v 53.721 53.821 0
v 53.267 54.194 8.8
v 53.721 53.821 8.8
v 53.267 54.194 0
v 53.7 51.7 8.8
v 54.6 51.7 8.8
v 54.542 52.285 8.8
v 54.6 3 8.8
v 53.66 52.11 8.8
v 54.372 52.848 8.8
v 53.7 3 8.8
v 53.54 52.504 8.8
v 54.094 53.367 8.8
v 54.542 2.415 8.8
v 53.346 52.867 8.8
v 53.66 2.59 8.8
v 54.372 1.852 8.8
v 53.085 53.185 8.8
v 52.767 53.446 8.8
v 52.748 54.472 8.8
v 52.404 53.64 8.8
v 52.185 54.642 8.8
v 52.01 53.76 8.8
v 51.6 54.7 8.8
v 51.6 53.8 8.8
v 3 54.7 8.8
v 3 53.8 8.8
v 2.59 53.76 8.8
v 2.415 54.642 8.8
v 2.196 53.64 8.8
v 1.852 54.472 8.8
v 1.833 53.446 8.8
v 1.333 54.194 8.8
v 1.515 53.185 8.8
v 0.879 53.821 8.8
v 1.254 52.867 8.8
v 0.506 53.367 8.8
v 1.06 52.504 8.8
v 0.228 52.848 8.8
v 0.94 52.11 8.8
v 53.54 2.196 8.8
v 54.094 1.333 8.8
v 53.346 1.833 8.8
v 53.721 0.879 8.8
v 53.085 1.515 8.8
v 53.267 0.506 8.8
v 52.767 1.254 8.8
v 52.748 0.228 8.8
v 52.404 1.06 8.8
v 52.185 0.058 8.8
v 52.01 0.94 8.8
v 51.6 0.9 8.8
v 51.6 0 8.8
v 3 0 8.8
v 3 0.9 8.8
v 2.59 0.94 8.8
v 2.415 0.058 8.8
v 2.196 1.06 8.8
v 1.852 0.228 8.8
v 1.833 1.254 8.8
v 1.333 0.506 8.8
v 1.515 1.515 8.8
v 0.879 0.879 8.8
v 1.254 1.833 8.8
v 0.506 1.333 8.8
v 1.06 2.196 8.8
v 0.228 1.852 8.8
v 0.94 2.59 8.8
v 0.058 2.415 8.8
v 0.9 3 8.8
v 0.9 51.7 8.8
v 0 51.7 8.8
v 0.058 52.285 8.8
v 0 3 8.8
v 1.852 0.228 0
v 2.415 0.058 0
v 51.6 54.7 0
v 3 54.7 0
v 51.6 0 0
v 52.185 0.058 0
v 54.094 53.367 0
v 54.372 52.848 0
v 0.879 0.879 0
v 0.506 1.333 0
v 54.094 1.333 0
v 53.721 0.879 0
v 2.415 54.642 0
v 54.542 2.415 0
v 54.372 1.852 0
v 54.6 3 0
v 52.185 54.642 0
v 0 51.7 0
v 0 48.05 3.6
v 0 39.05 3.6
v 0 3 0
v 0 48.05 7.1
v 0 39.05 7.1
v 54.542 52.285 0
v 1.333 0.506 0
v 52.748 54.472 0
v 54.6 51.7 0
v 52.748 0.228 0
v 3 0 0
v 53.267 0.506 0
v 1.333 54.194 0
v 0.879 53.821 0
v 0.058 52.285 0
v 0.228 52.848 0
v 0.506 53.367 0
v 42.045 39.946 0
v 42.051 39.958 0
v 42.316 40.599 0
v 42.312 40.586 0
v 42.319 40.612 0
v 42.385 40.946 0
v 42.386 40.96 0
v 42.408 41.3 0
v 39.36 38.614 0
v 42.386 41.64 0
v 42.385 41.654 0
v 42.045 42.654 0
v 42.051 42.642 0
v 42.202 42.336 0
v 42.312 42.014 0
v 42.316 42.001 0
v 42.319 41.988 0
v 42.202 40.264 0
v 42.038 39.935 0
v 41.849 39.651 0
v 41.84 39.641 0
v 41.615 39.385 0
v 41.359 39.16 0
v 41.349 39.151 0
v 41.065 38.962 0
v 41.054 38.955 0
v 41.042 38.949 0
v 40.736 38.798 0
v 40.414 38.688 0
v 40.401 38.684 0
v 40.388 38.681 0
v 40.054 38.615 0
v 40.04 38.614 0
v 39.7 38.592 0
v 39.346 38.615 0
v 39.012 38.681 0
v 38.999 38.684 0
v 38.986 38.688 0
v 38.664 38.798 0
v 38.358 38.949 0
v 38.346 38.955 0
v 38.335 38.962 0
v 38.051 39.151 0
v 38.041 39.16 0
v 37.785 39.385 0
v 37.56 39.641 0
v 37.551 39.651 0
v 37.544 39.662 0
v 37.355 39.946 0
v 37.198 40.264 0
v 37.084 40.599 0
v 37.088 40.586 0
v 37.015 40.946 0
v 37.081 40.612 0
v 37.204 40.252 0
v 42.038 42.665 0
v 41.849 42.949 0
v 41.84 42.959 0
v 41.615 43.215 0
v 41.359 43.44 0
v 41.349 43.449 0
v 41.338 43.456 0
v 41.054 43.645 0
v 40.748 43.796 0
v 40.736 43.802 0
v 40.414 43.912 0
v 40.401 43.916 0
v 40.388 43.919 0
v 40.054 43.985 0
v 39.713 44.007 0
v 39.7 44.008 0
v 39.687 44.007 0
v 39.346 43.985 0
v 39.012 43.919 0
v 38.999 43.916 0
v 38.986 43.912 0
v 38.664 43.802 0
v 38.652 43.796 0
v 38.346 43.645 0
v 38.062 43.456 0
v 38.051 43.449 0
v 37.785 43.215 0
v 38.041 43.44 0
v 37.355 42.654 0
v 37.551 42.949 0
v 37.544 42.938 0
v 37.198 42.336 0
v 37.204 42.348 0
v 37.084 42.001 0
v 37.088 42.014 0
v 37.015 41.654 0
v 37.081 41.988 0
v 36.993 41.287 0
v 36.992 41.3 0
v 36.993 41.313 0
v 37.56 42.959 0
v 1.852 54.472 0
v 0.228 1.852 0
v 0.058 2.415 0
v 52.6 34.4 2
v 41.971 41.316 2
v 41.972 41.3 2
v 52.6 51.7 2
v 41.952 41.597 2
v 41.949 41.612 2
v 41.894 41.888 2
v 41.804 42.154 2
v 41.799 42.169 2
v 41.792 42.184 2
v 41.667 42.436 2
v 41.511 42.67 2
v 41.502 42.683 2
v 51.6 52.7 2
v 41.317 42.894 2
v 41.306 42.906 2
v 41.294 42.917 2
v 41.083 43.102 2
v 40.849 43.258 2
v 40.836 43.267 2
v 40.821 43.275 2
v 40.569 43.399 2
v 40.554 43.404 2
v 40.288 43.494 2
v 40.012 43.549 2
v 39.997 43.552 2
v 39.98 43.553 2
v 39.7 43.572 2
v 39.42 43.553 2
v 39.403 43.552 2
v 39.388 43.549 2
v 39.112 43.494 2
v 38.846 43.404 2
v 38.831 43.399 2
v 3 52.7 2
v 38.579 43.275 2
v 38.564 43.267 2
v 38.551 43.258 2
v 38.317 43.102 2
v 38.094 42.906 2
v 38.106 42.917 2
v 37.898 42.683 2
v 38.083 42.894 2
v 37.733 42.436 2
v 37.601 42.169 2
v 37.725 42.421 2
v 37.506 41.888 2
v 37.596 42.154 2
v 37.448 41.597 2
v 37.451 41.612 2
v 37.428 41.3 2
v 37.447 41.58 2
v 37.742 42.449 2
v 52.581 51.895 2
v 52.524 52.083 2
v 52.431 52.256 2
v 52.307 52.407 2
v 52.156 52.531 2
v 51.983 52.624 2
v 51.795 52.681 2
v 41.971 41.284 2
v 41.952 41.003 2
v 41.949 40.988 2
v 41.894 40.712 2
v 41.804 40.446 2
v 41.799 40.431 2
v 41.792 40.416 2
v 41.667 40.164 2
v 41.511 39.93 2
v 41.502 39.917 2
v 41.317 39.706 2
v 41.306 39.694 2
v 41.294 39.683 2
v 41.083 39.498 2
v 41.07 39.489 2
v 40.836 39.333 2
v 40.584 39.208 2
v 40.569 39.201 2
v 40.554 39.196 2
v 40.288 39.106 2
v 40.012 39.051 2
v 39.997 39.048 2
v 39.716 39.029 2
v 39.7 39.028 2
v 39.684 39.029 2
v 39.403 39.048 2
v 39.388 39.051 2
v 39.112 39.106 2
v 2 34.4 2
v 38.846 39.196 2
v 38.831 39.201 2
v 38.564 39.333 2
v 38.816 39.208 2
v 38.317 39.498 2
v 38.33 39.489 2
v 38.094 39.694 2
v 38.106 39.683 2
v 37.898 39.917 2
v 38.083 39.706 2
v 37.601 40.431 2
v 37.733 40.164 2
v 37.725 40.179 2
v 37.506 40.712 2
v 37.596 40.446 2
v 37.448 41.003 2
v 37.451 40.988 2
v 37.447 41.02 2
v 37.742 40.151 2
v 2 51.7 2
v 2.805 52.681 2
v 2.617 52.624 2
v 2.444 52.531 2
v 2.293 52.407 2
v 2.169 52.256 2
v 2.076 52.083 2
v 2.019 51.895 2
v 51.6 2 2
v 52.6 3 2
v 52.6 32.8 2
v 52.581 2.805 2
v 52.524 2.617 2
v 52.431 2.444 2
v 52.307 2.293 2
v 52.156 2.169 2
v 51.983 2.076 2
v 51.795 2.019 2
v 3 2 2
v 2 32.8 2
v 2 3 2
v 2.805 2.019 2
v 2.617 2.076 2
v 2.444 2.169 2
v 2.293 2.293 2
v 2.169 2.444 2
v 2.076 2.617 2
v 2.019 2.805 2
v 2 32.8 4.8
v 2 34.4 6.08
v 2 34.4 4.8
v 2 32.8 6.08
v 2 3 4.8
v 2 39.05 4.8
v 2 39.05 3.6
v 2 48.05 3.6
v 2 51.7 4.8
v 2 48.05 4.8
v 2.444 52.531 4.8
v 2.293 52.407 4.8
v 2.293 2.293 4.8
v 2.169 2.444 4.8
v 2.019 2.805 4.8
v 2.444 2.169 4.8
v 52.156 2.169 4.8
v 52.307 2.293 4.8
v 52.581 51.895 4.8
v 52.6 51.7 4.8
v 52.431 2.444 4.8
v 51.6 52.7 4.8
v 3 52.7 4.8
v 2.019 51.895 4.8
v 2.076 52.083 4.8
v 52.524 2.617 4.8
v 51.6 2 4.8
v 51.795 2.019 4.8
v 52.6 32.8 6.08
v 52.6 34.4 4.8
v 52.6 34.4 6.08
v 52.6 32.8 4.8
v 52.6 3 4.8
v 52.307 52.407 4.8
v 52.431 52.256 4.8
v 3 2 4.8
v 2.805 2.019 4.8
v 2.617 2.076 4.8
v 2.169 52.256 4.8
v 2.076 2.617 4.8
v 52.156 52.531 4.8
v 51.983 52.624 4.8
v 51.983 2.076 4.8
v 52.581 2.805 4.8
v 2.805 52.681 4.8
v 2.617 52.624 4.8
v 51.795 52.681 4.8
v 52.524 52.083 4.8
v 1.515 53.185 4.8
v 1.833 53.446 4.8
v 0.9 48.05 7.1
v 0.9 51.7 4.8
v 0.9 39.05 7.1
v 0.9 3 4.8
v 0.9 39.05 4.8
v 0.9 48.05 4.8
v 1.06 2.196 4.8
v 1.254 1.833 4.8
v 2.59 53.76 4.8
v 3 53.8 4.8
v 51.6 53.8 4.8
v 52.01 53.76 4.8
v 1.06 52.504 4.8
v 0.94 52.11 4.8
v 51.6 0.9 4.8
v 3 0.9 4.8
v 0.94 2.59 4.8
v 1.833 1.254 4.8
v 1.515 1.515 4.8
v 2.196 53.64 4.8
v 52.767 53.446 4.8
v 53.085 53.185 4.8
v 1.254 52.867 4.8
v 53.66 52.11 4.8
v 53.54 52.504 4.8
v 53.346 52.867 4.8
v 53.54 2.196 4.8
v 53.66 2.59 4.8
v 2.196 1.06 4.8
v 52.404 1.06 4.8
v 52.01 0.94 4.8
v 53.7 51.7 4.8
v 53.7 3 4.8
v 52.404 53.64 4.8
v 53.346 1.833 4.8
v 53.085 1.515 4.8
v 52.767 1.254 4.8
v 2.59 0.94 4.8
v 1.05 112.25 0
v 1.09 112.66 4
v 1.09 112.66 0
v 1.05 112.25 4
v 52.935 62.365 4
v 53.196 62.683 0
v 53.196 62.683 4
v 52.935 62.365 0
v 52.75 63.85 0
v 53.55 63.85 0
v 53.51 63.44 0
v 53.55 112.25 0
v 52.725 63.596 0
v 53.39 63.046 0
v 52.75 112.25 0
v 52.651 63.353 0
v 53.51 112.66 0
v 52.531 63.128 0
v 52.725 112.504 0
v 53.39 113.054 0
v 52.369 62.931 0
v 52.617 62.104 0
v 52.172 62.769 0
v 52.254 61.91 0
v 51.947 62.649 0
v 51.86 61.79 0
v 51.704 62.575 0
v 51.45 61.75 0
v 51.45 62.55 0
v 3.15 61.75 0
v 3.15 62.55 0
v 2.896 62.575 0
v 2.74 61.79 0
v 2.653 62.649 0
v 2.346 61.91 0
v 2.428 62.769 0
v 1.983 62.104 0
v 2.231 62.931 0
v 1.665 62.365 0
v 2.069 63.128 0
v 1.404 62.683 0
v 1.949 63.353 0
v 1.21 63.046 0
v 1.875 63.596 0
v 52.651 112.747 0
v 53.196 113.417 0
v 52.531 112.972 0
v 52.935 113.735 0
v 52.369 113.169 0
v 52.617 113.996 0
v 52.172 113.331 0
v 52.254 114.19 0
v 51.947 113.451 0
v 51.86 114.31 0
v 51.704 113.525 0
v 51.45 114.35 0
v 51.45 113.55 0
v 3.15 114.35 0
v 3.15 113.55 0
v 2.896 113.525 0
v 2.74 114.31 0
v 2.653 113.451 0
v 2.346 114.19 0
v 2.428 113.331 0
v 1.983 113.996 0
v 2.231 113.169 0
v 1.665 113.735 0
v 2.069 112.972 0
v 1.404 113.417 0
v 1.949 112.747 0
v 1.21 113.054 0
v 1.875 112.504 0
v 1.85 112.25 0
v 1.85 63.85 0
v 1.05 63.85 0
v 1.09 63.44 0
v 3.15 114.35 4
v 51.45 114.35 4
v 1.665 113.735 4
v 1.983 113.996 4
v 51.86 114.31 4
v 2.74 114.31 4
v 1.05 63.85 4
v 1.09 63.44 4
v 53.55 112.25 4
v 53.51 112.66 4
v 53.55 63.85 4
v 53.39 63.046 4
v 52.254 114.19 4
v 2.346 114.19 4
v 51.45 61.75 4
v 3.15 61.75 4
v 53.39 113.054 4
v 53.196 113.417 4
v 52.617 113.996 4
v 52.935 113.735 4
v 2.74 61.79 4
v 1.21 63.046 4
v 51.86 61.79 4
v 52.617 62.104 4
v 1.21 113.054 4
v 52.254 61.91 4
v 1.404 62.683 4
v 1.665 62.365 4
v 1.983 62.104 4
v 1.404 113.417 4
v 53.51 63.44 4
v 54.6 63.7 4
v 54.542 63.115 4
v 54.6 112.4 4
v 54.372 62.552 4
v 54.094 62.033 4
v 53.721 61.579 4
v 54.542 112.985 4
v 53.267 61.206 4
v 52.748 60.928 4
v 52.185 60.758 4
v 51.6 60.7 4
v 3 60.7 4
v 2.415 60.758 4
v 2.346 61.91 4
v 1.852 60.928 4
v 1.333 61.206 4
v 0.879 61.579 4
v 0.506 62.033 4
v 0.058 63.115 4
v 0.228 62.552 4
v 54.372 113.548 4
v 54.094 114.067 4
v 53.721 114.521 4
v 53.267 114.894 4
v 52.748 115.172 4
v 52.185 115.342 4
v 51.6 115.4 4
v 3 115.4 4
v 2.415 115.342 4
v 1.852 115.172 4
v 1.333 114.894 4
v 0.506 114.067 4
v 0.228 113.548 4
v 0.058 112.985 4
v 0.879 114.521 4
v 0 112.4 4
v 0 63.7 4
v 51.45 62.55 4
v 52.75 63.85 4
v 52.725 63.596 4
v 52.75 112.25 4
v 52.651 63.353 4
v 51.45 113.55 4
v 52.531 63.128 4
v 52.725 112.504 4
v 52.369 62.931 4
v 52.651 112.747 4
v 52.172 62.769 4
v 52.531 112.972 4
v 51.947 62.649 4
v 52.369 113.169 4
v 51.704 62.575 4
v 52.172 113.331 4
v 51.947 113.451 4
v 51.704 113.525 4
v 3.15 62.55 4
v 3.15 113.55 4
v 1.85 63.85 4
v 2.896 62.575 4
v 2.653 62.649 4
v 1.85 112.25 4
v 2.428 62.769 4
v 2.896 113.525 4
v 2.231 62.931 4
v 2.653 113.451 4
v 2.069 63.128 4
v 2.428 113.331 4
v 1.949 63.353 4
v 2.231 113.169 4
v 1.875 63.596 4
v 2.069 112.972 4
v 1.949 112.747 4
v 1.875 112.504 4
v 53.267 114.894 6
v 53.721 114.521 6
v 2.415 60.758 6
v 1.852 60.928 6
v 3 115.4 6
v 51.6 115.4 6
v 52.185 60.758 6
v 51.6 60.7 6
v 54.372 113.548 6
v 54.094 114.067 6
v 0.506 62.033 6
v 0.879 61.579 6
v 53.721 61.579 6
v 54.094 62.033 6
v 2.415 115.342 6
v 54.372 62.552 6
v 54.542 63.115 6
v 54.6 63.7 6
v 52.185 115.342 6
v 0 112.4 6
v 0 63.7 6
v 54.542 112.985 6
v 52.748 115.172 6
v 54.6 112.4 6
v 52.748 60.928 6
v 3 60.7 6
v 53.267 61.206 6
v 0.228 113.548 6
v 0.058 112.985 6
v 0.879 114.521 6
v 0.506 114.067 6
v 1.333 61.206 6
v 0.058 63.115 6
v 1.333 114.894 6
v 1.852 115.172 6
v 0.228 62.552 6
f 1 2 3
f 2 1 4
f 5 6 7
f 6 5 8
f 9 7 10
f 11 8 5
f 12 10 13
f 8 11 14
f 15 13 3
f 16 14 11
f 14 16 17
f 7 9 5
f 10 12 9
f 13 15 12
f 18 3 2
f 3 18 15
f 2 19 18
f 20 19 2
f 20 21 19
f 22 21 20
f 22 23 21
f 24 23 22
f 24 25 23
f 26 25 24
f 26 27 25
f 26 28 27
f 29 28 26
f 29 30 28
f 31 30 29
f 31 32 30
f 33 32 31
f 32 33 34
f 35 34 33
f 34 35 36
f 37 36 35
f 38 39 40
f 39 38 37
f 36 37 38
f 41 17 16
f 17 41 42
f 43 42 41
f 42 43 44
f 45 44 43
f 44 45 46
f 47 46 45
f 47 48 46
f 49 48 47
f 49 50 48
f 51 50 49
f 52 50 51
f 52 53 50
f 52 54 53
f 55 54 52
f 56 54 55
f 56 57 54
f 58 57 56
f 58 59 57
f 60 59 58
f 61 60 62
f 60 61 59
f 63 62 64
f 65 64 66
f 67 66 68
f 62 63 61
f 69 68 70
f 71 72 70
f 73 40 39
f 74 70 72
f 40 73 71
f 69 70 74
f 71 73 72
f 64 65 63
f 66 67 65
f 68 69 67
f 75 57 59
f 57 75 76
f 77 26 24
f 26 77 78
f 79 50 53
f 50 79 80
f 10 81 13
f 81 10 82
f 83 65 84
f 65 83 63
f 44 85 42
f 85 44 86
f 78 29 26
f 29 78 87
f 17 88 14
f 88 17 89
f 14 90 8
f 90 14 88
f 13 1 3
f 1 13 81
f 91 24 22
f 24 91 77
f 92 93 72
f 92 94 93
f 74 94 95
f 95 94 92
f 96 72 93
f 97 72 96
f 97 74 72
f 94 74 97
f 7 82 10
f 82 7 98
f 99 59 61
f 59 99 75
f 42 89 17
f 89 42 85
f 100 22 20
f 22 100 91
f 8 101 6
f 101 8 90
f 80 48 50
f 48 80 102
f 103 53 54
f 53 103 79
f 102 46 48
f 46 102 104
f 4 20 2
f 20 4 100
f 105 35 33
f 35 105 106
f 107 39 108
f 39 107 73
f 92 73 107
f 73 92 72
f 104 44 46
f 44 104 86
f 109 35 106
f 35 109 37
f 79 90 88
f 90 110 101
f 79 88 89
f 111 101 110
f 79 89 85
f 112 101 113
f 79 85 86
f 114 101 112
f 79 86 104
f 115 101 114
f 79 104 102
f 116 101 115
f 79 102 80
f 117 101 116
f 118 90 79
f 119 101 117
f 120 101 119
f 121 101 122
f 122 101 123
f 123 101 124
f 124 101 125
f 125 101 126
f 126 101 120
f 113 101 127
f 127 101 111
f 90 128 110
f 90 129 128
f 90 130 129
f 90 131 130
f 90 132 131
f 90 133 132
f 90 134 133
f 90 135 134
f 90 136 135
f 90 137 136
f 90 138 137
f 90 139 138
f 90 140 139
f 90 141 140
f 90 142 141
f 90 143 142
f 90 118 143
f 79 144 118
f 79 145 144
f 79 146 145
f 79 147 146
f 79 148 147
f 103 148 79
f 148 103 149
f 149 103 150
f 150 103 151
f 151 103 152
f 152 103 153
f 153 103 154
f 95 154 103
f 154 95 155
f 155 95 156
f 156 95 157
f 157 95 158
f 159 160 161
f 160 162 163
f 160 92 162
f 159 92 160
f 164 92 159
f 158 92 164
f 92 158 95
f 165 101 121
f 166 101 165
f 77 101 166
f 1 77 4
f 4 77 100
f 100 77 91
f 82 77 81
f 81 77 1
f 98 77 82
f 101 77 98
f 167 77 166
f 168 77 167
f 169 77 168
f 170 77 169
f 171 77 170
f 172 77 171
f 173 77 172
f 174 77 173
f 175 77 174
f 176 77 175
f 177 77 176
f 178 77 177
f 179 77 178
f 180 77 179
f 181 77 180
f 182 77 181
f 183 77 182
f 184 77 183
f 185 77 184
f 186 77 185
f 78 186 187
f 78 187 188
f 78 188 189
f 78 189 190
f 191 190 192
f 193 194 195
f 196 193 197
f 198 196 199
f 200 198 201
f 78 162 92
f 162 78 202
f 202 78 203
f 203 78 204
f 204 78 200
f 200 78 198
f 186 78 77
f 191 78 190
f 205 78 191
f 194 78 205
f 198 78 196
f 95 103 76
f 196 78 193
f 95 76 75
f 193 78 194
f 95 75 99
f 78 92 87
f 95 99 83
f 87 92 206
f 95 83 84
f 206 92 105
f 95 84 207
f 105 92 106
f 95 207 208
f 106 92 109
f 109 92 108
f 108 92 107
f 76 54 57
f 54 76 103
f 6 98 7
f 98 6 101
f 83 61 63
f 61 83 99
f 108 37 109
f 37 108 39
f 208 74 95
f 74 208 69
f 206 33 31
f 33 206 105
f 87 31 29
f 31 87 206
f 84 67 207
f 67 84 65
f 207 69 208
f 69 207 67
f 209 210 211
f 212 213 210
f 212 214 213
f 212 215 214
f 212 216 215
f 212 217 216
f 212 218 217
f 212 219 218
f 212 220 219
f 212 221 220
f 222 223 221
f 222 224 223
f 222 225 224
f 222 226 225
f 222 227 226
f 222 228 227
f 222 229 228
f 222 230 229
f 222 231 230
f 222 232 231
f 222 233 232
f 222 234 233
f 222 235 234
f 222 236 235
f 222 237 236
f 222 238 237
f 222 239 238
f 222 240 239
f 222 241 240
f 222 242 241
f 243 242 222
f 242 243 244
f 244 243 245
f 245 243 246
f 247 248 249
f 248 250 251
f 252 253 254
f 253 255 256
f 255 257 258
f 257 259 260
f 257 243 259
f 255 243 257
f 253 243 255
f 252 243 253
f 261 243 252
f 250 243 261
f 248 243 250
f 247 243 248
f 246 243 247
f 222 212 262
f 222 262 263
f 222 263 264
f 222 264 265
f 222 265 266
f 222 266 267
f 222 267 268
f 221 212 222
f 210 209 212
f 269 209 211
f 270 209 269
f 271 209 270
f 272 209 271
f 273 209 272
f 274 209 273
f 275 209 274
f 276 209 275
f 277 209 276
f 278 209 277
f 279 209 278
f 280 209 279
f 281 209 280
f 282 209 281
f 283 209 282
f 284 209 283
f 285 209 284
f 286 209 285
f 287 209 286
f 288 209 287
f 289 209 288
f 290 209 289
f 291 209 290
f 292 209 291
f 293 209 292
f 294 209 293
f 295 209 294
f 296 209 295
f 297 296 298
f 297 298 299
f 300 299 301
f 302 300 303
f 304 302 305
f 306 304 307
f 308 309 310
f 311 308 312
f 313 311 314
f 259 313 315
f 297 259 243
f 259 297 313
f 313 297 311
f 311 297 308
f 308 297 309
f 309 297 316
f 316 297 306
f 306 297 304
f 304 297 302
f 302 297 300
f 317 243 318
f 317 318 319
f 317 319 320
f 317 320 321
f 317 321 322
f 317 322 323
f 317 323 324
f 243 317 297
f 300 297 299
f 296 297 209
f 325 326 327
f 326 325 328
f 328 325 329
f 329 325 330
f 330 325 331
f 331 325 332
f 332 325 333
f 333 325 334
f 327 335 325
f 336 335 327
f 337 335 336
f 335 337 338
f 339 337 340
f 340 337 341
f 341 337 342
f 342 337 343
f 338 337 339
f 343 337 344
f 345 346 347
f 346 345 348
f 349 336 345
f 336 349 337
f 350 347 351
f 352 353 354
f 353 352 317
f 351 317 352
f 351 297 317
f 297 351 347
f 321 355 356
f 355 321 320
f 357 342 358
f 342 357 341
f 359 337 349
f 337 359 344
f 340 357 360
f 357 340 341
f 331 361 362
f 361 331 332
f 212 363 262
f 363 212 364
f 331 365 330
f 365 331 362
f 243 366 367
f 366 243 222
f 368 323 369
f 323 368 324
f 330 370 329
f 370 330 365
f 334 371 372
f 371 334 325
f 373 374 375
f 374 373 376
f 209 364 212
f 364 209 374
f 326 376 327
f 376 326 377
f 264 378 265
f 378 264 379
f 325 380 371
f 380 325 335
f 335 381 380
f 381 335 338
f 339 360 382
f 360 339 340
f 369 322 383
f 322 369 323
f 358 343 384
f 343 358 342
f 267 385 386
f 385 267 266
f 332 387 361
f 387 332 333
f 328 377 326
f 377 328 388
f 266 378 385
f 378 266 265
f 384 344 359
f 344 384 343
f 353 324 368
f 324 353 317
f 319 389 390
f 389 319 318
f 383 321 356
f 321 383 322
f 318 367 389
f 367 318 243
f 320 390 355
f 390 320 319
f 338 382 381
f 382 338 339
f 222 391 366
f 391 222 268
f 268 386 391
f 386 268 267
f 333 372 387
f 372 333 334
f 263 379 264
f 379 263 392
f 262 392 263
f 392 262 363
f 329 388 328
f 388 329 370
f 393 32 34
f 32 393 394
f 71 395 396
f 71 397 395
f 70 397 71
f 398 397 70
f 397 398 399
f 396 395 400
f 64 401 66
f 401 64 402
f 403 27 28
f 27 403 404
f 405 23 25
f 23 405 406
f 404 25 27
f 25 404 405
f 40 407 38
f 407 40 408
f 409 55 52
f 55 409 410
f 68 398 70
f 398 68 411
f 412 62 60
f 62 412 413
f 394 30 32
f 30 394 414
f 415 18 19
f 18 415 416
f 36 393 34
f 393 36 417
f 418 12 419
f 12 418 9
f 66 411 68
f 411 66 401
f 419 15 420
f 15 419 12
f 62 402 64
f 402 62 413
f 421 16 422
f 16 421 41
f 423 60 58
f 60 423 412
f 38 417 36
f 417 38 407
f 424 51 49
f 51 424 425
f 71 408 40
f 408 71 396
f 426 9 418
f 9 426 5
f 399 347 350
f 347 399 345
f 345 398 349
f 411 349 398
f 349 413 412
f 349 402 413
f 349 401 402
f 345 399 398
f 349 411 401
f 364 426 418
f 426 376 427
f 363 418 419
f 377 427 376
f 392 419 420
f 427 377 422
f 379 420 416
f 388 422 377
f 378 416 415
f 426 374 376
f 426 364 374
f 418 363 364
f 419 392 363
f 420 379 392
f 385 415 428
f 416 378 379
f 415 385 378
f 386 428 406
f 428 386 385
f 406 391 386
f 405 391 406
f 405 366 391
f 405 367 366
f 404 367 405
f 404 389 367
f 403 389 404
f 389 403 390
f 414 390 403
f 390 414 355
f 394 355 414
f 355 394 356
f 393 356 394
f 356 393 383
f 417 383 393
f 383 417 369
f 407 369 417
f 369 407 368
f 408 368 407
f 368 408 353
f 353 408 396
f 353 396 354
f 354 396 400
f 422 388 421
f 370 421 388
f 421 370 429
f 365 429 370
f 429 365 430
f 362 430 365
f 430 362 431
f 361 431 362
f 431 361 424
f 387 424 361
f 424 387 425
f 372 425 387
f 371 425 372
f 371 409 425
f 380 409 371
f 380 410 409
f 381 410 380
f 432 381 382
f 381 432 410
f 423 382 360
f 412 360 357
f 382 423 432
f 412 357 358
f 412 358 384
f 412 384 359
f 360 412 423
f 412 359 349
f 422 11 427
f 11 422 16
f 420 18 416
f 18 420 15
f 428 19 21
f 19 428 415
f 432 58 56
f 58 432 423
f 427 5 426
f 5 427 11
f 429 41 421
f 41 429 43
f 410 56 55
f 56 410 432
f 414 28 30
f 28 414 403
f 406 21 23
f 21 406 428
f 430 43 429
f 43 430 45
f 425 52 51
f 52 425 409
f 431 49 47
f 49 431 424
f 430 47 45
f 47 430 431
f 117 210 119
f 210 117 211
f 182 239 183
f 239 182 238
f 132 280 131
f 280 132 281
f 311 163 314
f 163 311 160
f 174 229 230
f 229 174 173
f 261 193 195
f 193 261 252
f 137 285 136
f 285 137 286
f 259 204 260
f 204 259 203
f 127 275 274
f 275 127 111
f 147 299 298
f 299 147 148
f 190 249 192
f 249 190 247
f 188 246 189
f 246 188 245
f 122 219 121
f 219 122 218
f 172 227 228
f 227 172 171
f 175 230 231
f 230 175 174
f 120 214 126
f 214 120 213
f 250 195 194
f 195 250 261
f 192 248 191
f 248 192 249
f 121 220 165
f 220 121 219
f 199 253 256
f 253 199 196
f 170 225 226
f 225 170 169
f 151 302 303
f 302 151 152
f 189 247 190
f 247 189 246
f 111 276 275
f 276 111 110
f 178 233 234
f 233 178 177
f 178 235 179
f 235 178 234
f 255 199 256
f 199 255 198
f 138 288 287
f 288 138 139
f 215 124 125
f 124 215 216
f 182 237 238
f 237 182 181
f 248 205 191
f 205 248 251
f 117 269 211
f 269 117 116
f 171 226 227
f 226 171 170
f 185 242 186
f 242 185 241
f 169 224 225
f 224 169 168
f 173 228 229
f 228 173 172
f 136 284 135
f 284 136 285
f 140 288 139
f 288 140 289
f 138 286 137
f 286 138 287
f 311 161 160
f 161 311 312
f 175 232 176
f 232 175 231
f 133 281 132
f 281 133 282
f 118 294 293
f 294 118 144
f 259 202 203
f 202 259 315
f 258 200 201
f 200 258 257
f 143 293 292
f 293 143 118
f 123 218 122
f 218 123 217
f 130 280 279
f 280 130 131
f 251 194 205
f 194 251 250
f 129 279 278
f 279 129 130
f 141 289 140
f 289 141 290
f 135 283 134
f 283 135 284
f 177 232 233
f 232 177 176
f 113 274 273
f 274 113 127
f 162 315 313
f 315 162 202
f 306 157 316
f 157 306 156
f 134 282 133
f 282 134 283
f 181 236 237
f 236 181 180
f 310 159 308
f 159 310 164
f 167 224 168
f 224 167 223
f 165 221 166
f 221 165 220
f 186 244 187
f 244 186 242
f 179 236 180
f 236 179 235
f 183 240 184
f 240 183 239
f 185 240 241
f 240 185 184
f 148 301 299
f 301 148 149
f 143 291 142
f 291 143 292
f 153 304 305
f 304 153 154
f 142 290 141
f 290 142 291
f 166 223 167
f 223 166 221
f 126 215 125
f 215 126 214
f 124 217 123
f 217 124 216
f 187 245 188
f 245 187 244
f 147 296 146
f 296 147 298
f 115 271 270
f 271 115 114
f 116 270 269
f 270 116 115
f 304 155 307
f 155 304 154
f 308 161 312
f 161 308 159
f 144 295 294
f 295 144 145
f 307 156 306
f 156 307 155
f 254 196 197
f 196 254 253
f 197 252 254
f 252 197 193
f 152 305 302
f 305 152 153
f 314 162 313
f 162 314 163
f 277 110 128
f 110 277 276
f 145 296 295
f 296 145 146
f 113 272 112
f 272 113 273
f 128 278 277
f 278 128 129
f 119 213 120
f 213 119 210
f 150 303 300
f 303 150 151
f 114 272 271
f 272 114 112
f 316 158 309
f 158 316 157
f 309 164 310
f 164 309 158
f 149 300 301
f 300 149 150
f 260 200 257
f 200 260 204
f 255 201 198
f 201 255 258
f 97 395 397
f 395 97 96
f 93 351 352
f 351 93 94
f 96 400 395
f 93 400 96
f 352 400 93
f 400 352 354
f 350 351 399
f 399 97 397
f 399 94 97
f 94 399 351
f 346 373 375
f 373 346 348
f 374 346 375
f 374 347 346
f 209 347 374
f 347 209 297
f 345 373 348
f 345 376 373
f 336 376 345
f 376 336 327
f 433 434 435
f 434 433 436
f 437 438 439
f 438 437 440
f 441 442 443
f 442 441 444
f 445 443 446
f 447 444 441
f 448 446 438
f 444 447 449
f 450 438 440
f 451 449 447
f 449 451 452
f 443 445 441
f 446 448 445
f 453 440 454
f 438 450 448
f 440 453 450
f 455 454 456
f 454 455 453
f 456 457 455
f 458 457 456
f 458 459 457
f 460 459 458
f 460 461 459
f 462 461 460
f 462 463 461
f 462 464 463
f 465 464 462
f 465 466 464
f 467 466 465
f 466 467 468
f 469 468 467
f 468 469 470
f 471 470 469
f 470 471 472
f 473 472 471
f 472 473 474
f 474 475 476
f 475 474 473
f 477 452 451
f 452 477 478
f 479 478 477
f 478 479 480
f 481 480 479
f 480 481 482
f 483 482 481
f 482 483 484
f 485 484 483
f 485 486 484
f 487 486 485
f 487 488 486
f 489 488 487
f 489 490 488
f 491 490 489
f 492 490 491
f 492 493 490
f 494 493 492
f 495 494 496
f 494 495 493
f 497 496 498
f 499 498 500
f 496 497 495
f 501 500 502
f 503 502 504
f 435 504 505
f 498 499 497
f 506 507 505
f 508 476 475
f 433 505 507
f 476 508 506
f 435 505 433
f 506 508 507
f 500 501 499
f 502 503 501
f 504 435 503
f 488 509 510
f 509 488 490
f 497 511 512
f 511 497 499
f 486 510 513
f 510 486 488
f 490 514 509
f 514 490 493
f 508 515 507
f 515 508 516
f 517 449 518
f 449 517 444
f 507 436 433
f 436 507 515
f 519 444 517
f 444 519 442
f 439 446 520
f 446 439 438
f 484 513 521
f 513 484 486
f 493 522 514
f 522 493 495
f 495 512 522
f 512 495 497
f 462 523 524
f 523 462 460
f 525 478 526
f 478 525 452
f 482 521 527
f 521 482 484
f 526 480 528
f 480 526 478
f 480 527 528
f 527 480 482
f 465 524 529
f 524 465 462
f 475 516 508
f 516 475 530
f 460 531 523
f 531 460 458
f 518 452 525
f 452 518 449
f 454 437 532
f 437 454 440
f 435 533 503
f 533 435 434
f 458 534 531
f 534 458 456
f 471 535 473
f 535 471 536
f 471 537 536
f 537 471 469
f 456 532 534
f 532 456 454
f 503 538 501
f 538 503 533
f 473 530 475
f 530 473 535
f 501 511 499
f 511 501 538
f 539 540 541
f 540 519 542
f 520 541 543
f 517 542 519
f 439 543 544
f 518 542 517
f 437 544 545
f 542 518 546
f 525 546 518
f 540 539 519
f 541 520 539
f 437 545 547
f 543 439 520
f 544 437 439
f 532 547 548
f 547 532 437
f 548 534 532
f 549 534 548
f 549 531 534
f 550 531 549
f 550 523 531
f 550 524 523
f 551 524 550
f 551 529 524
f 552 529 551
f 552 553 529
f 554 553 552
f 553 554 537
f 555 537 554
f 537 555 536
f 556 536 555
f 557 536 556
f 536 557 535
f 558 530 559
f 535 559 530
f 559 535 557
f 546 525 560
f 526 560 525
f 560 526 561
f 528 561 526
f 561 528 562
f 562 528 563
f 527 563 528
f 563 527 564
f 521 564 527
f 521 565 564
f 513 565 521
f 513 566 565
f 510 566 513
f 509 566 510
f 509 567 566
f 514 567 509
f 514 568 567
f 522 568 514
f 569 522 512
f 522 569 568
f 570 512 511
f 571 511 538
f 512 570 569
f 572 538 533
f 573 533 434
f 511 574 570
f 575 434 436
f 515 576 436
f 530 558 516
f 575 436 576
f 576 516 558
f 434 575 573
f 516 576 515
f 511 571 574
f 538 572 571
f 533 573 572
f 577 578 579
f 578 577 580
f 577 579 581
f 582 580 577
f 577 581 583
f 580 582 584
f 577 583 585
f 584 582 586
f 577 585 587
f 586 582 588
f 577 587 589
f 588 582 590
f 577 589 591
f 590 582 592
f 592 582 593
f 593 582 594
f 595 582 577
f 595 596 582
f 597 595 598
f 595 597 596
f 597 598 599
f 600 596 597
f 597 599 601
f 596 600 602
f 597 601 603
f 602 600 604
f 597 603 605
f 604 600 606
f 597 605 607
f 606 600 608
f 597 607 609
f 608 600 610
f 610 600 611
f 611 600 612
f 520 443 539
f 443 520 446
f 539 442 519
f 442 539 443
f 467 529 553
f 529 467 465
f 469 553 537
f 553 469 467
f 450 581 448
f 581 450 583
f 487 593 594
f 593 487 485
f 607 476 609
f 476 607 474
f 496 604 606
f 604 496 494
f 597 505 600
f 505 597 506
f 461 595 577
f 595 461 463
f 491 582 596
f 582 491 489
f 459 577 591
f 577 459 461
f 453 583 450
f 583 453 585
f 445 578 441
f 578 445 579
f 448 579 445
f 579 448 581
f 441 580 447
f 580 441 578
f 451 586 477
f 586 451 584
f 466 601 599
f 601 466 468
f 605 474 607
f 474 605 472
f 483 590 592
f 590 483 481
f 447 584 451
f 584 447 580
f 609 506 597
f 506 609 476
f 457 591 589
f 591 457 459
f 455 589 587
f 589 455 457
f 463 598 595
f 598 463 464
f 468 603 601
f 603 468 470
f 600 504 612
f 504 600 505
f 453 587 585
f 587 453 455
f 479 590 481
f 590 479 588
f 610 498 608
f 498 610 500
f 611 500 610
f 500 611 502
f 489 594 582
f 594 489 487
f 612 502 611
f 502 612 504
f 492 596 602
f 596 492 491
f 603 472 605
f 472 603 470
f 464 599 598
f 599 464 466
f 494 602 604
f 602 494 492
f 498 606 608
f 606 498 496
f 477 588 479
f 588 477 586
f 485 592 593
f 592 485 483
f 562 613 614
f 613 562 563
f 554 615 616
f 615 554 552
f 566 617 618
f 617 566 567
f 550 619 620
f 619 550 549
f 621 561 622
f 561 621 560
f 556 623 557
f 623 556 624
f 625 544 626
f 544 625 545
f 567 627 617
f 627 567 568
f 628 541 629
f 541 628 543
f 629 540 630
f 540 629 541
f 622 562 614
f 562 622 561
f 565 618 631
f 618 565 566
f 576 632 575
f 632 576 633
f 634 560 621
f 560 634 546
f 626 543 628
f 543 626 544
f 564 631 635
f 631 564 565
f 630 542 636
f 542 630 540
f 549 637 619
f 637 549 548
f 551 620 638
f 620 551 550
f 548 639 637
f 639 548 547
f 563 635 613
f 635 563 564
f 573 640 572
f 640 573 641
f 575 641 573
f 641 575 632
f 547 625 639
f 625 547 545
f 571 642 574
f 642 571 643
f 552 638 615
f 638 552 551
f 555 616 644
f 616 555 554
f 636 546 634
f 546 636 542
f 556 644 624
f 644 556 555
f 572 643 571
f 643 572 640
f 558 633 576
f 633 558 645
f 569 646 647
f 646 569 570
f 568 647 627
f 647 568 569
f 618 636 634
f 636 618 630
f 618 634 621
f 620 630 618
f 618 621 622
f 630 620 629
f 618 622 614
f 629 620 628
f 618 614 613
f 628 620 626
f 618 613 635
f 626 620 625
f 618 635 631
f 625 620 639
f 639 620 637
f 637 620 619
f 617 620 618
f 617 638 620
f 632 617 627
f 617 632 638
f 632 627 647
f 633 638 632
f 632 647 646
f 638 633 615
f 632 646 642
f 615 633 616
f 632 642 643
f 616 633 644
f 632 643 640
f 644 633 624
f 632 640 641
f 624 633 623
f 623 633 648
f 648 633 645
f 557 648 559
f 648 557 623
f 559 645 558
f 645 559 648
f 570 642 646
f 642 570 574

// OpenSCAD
// Contenitore del pellet-meter.
//
// Due pezzi: scatola e coperchio. Sta SOPRA il coperchio della tramoggia;
// dentro il serbatoio sporge solo il cono di misura del sensore, che guarda
// in basso attraverso il fondo.
//
// Tutte le quote sono parametri. Quelle dei componenti vengono dai
// datasheet e NON sono state misurate sull'hardware: vedi la tabella
// "da rimisurare" piu' sotto.
//
//   openscad -o out/case.stl case.scad              // la sola scatola
//   openscad -o out/case.stl -D pezzo=\"coperchio\" case.scad
//   openscad -o out/case.stl -D pezzo=\"entrambi\" case.scad

// Cosa generare: "scatola", "coperchio", "entrambi" (affiancati, per il
// render) o "sezione" (taglio, per controllare gli interni).
pezzo = "entrambi";

// ---------------------------------------------------------------------------
// Componenti
// ---------------------------------------------------------------------------
// [larghezza, profondita', altezza] in mm, ingombro massimo compresi i
// componenti saldati sopra.
//
// DA RIMISURARE sull'esemplare reale, e perche':
//
//   scheda    il 21 x 17,5 e' da datasheet ed e' affidabile, ma l'altezza
//             dipende da come sono saldati gli header sulla millefori
//   batteria  le celle 603048 hanno tolleranze generose e spesso il
//             cartoncino e il nastro aggiungono mezzo millimetro per lato
//   sensore   l'ingombro del breakout VL53L1X cambia tra produttori, e con
//             esso la posizione della finestra ottica rispetto ai fori

scheda = [21.0, 17.5, 4.0];     // Seeed XIAO ESP32C6
batteria = [48.0, 30.0, 6.0];   // LiPo 603048, ~1000 mAh
sensore = [25.0, 13.0, 4.0];    // breakout VL53L1X, stima generosa

// Posizione della finestra ottica sul breakout, dal suo angolo inferiore
// sinistro. Anche questa cambia tra produttori.
finestra_ottica = [12.5, 6.5];
finestra_diametro = 4.5;        // apertura del sensore sulla scheda

// Connettore USB-C sulla scheda: larghezza, altezza e quota del centro dal
// piano della scheda.
usb = [9.0, 3.2];
usb_altezza_dal_piano = 1.6;

// ---------------------------------------------------------------------------
// Stampa
// ---------------------------------------------------------------------------

parete = 2.0;        // pareti verticali
fondo = 2.0;         // fondo della scatola
coperchio_sp = 2.0;  // spessore del coperchio

// Tolleranza di accoppiamento. E' l'unico numero da toccare se il
// coperchio entra duro o balla: il ritiro cambia con stampante e
// materiale, e non ha senso inseguirlo spargendo costanti nel modello.
gioco = 0.3;

labbro = 4.0;        // quanto il coperchio scende dentro la scatola
labbro_sp = 0.8;     // spessore del labbro
raggio = 3.0;        // raccordo verticale degli spigoli

// Aria attorno ai componenti, per infilarli senza forzare.
aria = 0.8;

// ---------------------------------------------------------------------------
// Vincoli di montaggio
// ---------------------------------------------------------------------------
// Non cambiano la geometria del pezzo: servono a controllare che il
// modello sia compatibile con l'installazione, e vengono stampati a
// fine render.

// Quanto deve stare la finestra ottica sopra il livello massimo del
// pellet. Sotto i 40 mm il VL53L1X non misura.
distanza_minima_pellet = 50;

// Spazio da lasciare libero verso coclea e microinterruttore di sicurezza
// del coperchio: il contenitore non deve entrarci dentro.
franco_coclea = 20;

// Angolo del cono di misura. Il VL53L1X arriva a 27 gradi; l'apertura nel
// fondo va svasata di conseguenza, altrimenti il bordo del foro entra nel
// fascio e il sensore misura la propria scatola.
fov = 27;

// ---------------------------------------------------------------------------
// Geometria derivata — da qui in giu' non ci sono numeri da cambiare
// ---------------------------------------------------------------------------

divisorio = 1.6;  // parete tra vano batteria e vano elettronica

// Vano batteria e vano elettronica stanno affiancati lungo Y.
// Nel vano elettronica, scheda e sensore stanno affiancati lungo X.
vano_elettronica = [
    scheda.x + aria + 3 + sensore.x + aria,
    max(scheda.y, sensore.y) + aria,
    max(scheda.z, sensore.z) + aria
];

vano_batteria = [batteria.x + aria, batteria.y + aria, batteria.z + aria];

interno = [
    max(vano_batteria.x, vano_elettronica.x),
    vano_batteria.y + divisorio + vano_elettronica.y,
    max(vano_batteria.z, vano_elettronica.z)
];

esterno = [
    interno.x + 2 * parete,
    interno.y + 2 * parete,
    interno.z + fondo + coperchio_sp
];

// Origine del vano elettronica, in coordinate interne.
el_x = 0;
el_y = vano_batteria.y + divisorio;

// Centro della finestra ottica, in coordinate interne. Il sensore e'
// appoggiato a destra nel vano elettronica.
sensore_x = vano_elettronica.x - sensore.x - aria / 2;
ottica = [
    el_x + sensore_x + finestra_ottica.x,
    el_y + aria / 2 + finestra_ottica.y
];

// Svaso del foro ottico: il cono si allarga scendendo verso il pellet.
svaso = fondo * tan(fov / 2);

// ---------------------------------------------------------------------------
// Pezzi
// ---------------------------------------------------------------------------

module guscio(dim, r) {
    // Prisma con spigoli verticali raccordati.
    hull() {
        for (x = [r, dim.x - r], y = [r, dim.y - r])
            translate([x, y, 0]) cylinder(h = dim.z, r = r, $fn = 32);
    }
}

// Altezza della sola scatola: il coperchio completa l'altezza esterna
// appoggiandosi in cima alle pareti, non sommandosi ad esse.
altezza_scatola = esterno.z - coperchio_sp;

// Quanto la battuta scava la faccia interna della parete.
battuta = labbro_sp + gioco;

module scatola() {
    difference() {
        guscio([esterno.x, esterno.y, altezza_scatola], raggio);

        // Cavita' interna
        translate([parete, parete, fondo])
            guscio([interno.x, interno.y, interno.z + 1],
                   max(0.1, raggio - parete));

        // Battuta del labbro: scava la faccia interna delle pareti negli
        // ultimi millimetri in alto. Il labbro entra qui dentro, non nello
        // spazio dei componenti: un labbro pieno schiaccerebbe la batteria.
        translate([parete - battuta, parete - battuta, altezza_scatola - labbro])
            guscio([interno.x + 2 * battuta, interno.y + 2 * battuta, labbro + 1],
                   max(0.1, raggio - parete + battuta));

        // Apertura ottica, svasata verso il basso.
        translate([parete + ottica.x, parete + ottica.y, -0.1])
            cylinder(h = fondo + 0.2,
                     r1 = finestra_diametro / 2 + svaso,
                     r2 = finestra_diametro / 2,
                     $fn = 48);

        // Apertura USB-C sulla parete corta, all'altezza del connettore.
        translate([-1,
                   parete + el_y + aria / 2 + scheda.y / 2 - usb.x / 2,
                   fondo + usb_altezza_dal_piano])
            cube([parete + 2, usb.x, usb.y + gioco]);
    }

    // Divisorio tra i due vani. Non arriva in cima: lascia passare il
    // filo della batteria senza doverci fare un foro.
    translate([parete, parete + vano_batteria.y, fondo])
        cube([interno.x, divisorio, interno.z * 0.6]);
}

module coperchio() {
    // Piastra piena...
    guscio([esterno.x, esterno.y, coperchio_sp], raggio);

    // ...piu' un labbro ad anello che scende nella battuta. E' cavo: la
    // faccia interna resta allineata a quella della cavita', cosi' non
    // ruba spazio ai componenti.
    translate([parete - battuta + gioco / 2, parete - battuta + gioco / 2, -labbro])
        difference() {
            guscio([interno.x + 2 * battuta - gioco,
                    interno.y + 2 * battuta - gioco, labbro],
                   max(0.1, raggio - parete + battuta));
            translate([labbro_sp, labbro_sp, -1])
                guscio([interno.x + 2 * battuta - gioco - 2 * labbro_sp,
                        interno.y + 2 * battuta - gioco - 2 * labbro_sp,
                        labbro + 2],
                       max(0.1, raggio - parete + battuta - labbro_sp));
        }
}

// ---------------------------------------------------------------------------
// Uscita
// ---------------------------------------------------------------------------

if (pezzo == "scatola") {
    scatola();
} else if (pezzo == "coperchio") {
    coperchio();
} else if (pezzo == "sezione") {
    difference() {
        scatola();
        translate([-1, esterno.y / 2, -1])
            cube([esterno.x + 2, esterno.y, esterno.z + 2]);
    }
} else {
    scatola();
    translate([0, esterno.y + 6, labbro]) coperchio();
}

// ---------------------------------------------------------------------------
// Quote dichiarate
// ---------------------------------------------------------------------------
// Vengono rilette da tools/check_case.py, che le confronta con il solido
// davvero generato: un parametro cambiato senza che la geometria lo segua
// e' un errore che non si vede guardando il render.

echo(str("QUOTE esterno=", esterno.x, "x", esterno.y, "x", esterno.z));
echo(str("QUOTE interno=", interno.x, "x", interno.y, "x", interno.z));
echo(str("QUOTE ottica=", ottica.x, ",", ottica.y));
echo(str("VINCOLO distanza_minima_pellet=", distanza_minima_pellet));
echo(str("VINCOLO franco_coclea=", franco_coclea));
